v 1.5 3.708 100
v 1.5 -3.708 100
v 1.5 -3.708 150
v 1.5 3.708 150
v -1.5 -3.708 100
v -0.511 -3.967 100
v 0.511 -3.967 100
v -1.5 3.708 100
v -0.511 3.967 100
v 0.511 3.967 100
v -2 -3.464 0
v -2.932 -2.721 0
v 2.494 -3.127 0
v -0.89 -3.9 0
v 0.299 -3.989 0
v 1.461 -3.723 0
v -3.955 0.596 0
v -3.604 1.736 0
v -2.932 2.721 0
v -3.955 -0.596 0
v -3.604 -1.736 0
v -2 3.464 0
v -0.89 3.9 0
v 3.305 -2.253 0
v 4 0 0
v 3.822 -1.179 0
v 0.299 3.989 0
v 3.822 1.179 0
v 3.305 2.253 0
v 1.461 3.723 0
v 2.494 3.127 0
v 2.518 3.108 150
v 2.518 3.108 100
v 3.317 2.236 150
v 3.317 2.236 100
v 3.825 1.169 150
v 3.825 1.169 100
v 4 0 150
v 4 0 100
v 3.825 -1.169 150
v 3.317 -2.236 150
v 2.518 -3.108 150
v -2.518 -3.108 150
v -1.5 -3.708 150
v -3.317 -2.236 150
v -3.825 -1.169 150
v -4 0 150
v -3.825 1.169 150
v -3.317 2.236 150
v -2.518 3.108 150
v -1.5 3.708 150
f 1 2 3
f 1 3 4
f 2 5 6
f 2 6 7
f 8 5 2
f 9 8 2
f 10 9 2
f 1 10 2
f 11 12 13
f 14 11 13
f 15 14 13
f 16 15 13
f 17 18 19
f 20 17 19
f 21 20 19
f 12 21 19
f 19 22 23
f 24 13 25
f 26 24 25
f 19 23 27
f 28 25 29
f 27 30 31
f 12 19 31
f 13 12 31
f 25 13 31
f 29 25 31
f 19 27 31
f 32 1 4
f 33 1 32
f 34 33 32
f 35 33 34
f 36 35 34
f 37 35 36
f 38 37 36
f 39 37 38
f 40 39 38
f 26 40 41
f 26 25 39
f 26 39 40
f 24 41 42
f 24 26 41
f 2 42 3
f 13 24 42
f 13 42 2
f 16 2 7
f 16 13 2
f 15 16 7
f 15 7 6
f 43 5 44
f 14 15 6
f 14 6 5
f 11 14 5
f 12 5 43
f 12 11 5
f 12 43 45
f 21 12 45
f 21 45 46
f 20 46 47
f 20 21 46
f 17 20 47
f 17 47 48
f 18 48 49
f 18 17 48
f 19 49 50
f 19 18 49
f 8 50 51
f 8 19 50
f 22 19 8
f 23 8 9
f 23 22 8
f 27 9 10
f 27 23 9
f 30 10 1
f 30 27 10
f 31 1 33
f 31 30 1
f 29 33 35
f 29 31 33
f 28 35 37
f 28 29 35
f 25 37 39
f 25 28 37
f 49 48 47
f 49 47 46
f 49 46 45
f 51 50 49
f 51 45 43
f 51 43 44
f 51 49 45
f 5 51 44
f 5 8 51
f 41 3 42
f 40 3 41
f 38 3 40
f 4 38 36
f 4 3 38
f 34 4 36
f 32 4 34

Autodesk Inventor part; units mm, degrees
ref_plane "YZ Plane" through (0, 0, 0) normal (1, 0, 0) x (0, 1, 0)
ref_plane "XZ Plane" through (0, 0, 0) normal (0, 1, 0) x (-1, 0, 0)
ref_plane "XY Plane" through (0, 0, 0) normal (0, 0, 1) x (1, 0, 0)
sketch "Sketch1" plane through (0, 0, 0) normal (0, 0, 1) x (1, 0, 0)
  circle A0 centre (0, 0) radius 4.05 projected
  circle A1 centre (0, 0) radius 7.5 projected
  circle A2 centre (0, 0) radius 4.05 projected
  circle A3 centre (0, 0) radius 4
  dimension "d0" = 8
extrude "Extrusion1" add sketch "Sketch1" along normal blind 100 contours A3
sketch "Sketch2" plane through (0, 0, 100) normal (0, 0, 1) x (1, 0, 0)
  circle A0 centre (0, 0) radius 4 projected
  line L0 (-1.5, 4) -> (-1.5, -4)
  line L1 (-1.5, -4) -> (1.5, -4)
  line L2 (1.5, -4) -> (1.5, 4)
  line L3 (1.5, 4) -> (-1.5, 4)
  line L4 (-1.5, 4) -> (1.5, -4) construction
  line L5 (-1.5, -4) -> (1.5, 4) construction
  point P0 (-1.5, -3.7081)
  point P1 (-1.5, 3.7081)
  point P2 (1.5, 3.7081)
  point P3 (1.5, -3.7081)
  dimension "d3" = 3
extrude "Extrusion2" add sketch "Sketch2" along normal blind 50 contours A0 L2 | L0 A0
properties part number "spirale"
